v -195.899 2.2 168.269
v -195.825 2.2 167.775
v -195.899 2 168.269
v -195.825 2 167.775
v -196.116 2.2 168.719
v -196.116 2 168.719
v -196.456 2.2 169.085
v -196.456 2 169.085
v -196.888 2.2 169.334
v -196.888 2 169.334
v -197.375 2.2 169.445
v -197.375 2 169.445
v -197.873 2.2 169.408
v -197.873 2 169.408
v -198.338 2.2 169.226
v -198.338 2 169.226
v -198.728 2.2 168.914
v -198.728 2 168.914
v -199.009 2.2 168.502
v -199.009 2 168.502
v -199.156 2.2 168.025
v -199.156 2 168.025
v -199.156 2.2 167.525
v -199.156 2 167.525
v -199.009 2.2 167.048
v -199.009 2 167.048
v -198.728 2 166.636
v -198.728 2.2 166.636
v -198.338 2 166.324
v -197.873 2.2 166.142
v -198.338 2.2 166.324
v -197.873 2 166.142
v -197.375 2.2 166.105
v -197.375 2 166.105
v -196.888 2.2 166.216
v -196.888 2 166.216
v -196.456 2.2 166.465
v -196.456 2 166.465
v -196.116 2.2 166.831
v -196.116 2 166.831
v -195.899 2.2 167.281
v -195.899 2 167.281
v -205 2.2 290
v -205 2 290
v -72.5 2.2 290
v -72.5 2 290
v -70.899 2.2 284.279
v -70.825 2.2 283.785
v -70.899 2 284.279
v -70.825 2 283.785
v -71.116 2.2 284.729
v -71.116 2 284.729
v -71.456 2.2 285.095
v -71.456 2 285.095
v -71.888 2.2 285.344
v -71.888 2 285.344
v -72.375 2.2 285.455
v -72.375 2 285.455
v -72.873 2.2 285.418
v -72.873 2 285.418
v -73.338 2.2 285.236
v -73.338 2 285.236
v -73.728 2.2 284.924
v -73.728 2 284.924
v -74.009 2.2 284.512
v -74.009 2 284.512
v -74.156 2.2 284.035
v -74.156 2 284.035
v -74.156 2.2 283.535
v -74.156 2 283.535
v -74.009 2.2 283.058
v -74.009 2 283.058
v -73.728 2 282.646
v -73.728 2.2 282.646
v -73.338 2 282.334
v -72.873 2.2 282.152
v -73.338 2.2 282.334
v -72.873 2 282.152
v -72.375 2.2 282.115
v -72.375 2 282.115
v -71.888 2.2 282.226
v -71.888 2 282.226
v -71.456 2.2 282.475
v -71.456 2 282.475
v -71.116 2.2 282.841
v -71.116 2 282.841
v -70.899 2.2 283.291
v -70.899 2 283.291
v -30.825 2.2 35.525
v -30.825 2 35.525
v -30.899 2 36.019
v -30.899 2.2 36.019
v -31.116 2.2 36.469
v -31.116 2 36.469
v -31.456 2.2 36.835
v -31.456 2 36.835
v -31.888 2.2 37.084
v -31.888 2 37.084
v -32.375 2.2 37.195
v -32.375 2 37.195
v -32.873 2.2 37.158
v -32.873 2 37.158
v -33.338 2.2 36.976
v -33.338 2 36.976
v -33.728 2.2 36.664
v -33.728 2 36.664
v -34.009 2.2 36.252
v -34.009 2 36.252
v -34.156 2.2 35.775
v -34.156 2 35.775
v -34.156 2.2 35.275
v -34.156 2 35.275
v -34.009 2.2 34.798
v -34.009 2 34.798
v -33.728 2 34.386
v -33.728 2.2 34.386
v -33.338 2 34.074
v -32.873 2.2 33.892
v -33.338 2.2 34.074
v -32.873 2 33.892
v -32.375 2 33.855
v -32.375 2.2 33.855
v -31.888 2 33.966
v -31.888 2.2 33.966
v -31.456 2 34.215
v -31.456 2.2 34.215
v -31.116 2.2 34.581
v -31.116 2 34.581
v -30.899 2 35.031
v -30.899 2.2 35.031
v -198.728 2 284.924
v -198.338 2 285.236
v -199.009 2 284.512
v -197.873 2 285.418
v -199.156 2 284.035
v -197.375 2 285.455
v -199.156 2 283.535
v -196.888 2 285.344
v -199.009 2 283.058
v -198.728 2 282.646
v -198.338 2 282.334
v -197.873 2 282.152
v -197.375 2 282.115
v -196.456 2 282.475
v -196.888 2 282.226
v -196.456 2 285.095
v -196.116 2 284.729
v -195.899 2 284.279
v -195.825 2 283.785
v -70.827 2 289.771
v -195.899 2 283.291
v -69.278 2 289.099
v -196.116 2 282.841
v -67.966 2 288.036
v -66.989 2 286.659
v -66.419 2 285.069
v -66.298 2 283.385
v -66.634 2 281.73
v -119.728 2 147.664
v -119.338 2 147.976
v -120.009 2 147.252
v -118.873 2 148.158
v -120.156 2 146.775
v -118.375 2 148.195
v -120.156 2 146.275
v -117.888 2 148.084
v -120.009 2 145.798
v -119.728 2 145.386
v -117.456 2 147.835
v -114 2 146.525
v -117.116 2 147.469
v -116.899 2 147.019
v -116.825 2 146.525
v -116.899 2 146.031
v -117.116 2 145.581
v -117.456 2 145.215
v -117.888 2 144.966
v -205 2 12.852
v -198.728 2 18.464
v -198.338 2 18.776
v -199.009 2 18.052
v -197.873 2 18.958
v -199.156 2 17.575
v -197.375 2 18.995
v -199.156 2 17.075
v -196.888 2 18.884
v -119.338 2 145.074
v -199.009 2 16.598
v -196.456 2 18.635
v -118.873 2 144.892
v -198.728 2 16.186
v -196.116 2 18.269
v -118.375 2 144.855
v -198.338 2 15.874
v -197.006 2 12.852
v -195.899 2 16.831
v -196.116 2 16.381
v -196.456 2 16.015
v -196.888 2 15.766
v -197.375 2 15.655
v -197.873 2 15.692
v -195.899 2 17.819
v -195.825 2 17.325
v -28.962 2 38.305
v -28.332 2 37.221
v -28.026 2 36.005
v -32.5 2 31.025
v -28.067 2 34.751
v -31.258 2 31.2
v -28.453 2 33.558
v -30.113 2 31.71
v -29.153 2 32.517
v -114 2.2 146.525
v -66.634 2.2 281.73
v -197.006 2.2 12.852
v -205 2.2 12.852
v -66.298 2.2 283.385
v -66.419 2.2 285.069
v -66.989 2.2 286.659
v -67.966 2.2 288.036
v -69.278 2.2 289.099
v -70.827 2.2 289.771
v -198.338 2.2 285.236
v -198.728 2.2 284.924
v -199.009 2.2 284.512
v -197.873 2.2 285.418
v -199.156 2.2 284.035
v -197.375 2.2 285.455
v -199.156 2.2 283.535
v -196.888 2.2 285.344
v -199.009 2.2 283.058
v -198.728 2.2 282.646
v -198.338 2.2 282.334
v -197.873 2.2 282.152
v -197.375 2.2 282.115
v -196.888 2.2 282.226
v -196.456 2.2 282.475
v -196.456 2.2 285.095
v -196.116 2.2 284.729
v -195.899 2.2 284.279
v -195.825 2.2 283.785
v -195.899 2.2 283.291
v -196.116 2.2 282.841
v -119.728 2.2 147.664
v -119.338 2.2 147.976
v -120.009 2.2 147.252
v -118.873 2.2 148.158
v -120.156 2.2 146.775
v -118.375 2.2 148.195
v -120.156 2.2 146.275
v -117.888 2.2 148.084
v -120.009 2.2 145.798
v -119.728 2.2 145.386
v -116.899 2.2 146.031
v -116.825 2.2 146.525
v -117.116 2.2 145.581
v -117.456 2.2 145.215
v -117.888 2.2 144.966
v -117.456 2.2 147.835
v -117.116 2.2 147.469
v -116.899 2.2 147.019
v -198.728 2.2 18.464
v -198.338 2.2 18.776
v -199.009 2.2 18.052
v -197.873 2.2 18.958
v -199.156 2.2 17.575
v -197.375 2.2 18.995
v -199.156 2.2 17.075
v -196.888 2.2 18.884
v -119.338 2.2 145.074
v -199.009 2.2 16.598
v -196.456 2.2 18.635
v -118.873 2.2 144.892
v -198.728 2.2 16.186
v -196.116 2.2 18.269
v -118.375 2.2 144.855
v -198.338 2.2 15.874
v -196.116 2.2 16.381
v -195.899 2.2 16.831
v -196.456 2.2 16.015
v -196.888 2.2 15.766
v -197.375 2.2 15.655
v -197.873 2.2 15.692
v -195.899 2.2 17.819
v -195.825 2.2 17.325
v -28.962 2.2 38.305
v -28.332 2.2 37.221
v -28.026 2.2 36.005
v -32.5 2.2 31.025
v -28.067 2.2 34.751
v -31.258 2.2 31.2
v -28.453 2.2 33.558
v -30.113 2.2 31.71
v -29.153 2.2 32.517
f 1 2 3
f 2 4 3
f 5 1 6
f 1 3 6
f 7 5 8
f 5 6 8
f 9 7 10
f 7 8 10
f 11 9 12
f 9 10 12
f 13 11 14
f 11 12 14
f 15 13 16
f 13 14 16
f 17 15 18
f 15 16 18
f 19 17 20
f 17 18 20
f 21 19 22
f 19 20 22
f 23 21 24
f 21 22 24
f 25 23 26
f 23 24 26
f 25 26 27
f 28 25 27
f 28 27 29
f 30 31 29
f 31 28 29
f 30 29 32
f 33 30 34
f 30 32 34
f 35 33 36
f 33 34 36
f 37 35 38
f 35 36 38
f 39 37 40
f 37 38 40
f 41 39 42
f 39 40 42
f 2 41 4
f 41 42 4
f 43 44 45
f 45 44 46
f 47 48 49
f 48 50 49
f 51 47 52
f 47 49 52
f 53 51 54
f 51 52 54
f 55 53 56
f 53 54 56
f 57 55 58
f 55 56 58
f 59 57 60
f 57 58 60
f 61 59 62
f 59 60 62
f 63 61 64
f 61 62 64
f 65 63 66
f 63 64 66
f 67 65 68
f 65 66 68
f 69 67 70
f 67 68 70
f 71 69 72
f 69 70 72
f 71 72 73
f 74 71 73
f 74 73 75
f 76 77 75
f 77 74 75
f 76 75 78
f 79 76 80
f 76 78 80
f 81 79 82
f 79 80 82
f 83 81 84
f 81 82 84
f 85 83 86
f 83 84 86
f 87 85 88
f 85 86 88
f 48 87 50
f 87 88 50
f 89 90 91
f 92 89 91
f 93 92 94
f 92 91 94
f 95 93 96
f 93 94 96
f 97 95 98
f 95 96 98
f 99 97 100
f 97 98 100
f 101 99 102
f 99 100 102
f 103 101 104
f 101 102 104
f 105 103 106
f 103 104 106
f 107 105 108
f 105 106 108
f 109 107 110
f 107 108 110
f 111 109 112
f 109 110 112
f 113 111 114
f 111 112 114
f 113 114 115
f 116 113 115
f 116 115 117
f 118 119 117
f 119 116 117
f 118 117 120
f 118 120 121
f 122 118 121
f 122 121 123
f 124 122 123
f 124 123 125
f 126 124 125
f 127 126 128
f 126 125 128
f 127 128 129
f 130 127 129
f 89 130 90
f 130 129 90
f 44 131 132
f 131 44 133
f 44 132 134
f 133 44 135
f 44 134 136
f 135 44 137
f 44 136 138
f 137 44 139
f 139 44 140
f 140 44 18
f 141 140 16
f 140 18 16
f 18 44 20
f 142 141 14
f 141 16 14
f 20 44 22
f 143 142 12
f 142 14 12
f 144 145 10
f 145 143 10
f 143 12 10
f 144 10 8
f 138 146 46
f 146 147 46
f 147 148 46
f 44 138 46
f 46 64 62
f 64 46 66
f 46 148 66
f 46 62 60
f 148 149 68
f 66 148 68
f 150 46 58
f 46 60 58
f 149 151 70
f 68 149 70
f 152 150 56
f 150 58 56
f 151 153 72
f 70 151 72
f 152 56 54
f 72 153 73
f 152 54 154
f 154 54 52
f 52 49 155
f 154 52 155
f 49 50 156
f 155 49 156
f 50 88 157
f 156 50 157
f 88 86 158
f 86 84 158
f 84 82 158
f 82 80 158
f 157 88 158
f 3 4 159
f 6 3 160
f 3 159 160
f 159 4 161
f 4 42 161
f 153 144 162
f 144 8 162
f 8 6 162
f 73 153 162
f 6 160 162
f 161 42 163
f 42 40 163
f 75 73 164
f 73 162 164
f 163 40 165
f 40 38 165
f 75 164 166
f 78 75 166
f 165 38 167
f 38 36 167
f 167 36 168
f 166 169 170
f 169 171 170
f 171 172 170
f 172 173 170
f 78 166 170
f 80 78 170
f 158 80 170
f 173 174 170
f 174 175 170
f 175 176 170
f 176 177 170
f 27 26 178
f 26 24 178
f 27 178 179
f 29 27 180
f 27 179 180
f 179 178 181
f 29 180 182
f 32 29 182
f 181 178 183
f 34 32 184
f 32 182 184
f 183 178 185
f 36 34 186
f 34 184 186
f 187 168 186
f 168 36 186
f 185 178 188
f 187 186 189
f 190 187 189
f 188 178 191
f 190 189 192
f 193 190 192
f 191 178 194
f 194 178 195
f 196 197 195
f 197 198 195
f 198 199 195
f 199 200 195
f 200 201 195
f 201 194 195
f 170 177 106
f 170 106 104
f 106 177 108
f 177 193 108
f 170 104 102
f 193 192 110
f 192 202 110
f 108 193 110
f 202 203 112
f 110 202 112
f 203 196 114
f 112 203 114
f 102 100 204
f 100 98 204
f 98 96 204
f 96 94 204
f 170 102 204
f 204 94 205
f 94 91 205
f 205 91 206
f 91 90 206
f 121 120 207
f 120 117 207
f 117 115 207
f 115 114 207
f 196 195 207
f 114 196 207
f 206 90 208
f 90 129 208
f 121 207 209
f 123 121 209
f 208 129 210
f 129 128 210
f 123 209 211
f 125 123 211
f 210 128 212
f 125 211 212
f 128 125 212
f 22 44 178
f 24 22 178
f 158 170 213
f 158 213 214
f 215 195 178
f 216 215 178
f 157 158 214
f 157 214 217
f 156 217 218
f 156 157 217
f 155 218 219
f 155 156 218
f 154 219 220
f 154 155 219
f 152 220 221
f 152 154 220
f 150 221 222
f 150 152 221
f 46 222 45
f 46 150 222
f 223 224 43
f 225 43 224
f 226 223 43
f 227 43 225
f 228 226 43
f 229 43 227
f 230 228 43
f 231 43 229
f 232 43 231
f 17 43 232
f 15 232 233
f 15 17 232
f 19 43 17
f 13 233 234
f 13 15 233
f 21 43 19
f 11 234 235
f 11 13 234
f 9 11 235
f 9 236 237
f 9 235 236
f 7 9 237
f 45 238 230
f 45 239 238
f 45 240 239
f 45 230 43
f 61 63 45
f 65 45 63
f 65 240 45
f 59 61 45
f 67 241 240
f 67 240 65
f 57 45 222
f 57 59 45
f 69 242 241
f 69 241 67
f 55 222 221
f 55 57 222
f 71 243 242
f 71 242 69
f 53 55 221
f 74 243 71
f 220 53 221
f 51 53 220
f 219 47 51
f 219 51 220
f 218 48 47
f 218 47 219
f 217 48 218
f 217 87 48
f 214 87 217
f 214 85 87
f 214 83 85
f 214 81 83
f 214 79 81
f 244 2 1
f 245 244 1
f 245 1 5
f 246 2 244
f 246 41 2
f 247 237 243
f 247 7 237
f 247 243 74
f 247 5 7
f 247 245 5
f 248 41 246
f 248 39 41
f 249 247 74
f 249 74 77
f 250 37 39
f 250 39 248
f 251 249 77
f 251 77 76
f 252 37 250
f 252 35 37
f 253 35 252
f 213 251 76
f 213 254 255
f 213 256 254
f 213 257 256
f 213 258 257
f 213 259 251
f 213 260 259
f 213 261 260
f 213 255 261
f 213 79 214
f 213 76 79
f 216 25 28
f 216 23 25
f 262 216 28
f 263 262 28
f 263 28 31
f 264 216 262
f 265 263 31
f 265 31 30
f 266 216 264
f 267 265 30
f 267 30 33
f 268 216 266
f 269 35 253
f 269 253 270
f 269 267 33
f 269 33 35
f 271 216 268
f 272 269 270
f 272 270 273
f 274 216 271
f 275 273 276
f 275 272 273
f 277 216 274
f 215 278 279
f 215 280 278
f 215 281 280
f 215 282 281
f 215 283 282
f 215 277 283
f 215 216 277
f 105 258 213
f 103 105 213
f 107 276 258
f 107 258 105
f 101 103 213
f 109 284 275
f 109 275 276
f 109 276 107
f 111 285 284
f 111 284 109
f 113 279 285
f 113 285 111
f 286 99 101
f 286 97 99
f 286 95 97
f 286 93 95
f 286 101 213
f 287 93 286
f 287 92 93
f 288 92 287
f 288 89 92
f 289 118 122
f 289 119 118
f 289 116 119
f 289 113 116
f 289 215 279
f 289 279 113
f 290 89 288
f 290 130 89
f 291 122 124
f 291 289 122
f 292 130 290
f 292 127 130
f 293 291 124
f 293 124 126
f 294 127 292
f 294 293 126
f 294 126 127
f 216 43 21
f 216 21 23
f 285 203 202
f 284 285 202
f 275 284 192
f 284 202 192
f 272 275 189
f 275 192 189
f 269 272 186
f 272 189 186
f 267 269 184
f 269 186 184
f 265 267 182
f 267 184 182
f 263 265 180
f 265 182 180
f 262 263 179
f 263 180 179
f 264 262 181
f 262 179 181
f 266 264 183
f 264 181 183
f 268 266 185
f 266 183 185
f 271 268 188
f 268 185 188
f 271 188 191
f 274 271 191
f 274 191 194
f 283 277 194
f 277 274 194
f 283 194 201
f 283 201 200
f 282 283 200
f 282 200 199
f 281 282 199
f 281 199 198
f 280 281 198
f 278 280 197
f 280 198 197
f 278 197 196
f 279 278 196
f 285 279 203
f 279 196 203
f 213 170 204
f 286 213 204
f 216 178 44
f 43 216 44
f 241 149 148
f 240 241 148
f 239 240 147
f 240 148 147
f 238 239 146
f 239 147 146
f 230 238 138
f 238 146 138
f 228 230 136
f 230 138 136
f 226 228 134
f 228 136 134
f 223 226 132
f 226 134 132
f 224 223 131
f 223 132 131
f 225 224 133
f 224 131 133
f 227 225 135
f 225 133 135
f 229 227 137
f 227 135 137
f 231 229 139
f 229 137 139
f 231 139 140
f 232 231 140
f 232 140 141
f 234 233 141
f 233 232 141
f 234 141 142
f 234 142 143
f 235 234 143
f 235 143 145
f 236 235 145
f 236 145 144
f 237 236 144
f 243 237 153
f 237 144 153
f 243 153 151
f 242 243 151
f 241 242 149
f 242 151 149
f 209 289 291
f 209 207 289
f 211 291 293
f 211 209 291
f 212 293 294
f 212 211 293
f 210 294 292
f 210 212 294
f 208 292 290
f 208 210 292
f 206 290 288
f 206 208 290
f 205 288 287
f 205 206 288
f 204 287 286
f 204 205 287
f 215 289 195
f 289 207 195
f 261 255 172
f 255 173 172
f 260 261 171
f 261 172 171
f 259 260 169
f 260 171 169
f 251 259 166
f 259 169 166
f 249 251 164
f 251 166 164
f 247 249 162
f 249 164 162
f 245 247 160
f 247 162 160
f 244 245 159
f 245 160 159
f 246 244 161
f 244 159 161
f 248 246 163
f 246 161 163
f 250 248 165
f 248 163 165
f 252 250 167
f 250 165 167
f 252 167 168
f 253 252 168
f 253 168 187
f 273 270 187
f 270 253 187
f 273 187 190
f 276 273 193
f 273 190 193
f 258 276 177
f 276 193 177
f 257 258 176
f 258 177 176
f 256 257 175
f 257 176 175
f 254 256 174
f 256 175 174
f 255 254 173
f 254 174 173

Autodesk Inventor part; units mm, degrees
ref_plane "YZ Plane" through (0, 0, 0) normal (1, 0, 0) x (0, 1, 0)
ref_plane "XZ Plane" through (0, 0, 0) normal (0, 1, 0) x (-1, 0, 0)
ref_plane "Work Plane1" through (-205, 2, 0) normal (0, 1, 0) x (1, 0, 0)
sketch "Sketch2" plane through (-205, 2, 0) normal (0, 1, 0) x (1, 0, 0)
  circle A0 centre (86.5, -146.525) radius 1.675 projected
  circle A1 centre (86.5, -146.525) radius 1.675
  circle A2 centre (86.5, -146.525) radius 4.5
  circle A3 centre (172.5, -35.525) radius 1.675 projected
  circle A4 centre (172.5, -35.525) radius 1.675
  circle A5 centre (172.5, -35.525) radius 4.5
  circle A6 centre (132.5, -283.785) radius 1.675 projected
  circle A7 centre (132.5, -283.785) radius 6.215
  line L0 (0, -290) -> (155, -290) projected
  circle A8 centre (7.5, -283.785) radius 1.675 projected
  circle A9 centre (7.5, -283.785) radius 4.5
  circle A10 centre (7.5, -167.775) radius 1.675 projected
  circle A11 centre (7.5, -167.775) radius 4.5
  circle A12 centre (7.5, -17.325) radius 1.675 projected
  circle A13 centre (7.5, -17.325) radius 4.5
  line L1 (0, -290) -> (132.5, -290)
  line L2 (91, -146.525) -> (138.3655, -281.7302)
  line L3 (91, -146.525) -> (176.0383, -38.3054)
  line L4 (172.5, -31.025) -> (7.9941, -12.8522)
  line L5 (7.9941, -12.8522) -> (0, -12.8522)
  line L6 (0, -12.8522) -> (0, -290)
  point P0 (205, 0)
  dimension "d3" = 9
  dimension "d7" = 9
  dimension "d4" = 9
  dimension "d5" = 9
  dimension "d6" = 9
extrude "Extrusion1" add sketch "Sketch2" along normal blind 0.2 contours A2 | L2 A7 L0 L6 L5 A13 L4 A5 L3 | A7 | A5 | A13 L5 | A9 | A11 picked at (10.9979, -16.8298)
properties part number "base_main_pcb_full_itr3"
